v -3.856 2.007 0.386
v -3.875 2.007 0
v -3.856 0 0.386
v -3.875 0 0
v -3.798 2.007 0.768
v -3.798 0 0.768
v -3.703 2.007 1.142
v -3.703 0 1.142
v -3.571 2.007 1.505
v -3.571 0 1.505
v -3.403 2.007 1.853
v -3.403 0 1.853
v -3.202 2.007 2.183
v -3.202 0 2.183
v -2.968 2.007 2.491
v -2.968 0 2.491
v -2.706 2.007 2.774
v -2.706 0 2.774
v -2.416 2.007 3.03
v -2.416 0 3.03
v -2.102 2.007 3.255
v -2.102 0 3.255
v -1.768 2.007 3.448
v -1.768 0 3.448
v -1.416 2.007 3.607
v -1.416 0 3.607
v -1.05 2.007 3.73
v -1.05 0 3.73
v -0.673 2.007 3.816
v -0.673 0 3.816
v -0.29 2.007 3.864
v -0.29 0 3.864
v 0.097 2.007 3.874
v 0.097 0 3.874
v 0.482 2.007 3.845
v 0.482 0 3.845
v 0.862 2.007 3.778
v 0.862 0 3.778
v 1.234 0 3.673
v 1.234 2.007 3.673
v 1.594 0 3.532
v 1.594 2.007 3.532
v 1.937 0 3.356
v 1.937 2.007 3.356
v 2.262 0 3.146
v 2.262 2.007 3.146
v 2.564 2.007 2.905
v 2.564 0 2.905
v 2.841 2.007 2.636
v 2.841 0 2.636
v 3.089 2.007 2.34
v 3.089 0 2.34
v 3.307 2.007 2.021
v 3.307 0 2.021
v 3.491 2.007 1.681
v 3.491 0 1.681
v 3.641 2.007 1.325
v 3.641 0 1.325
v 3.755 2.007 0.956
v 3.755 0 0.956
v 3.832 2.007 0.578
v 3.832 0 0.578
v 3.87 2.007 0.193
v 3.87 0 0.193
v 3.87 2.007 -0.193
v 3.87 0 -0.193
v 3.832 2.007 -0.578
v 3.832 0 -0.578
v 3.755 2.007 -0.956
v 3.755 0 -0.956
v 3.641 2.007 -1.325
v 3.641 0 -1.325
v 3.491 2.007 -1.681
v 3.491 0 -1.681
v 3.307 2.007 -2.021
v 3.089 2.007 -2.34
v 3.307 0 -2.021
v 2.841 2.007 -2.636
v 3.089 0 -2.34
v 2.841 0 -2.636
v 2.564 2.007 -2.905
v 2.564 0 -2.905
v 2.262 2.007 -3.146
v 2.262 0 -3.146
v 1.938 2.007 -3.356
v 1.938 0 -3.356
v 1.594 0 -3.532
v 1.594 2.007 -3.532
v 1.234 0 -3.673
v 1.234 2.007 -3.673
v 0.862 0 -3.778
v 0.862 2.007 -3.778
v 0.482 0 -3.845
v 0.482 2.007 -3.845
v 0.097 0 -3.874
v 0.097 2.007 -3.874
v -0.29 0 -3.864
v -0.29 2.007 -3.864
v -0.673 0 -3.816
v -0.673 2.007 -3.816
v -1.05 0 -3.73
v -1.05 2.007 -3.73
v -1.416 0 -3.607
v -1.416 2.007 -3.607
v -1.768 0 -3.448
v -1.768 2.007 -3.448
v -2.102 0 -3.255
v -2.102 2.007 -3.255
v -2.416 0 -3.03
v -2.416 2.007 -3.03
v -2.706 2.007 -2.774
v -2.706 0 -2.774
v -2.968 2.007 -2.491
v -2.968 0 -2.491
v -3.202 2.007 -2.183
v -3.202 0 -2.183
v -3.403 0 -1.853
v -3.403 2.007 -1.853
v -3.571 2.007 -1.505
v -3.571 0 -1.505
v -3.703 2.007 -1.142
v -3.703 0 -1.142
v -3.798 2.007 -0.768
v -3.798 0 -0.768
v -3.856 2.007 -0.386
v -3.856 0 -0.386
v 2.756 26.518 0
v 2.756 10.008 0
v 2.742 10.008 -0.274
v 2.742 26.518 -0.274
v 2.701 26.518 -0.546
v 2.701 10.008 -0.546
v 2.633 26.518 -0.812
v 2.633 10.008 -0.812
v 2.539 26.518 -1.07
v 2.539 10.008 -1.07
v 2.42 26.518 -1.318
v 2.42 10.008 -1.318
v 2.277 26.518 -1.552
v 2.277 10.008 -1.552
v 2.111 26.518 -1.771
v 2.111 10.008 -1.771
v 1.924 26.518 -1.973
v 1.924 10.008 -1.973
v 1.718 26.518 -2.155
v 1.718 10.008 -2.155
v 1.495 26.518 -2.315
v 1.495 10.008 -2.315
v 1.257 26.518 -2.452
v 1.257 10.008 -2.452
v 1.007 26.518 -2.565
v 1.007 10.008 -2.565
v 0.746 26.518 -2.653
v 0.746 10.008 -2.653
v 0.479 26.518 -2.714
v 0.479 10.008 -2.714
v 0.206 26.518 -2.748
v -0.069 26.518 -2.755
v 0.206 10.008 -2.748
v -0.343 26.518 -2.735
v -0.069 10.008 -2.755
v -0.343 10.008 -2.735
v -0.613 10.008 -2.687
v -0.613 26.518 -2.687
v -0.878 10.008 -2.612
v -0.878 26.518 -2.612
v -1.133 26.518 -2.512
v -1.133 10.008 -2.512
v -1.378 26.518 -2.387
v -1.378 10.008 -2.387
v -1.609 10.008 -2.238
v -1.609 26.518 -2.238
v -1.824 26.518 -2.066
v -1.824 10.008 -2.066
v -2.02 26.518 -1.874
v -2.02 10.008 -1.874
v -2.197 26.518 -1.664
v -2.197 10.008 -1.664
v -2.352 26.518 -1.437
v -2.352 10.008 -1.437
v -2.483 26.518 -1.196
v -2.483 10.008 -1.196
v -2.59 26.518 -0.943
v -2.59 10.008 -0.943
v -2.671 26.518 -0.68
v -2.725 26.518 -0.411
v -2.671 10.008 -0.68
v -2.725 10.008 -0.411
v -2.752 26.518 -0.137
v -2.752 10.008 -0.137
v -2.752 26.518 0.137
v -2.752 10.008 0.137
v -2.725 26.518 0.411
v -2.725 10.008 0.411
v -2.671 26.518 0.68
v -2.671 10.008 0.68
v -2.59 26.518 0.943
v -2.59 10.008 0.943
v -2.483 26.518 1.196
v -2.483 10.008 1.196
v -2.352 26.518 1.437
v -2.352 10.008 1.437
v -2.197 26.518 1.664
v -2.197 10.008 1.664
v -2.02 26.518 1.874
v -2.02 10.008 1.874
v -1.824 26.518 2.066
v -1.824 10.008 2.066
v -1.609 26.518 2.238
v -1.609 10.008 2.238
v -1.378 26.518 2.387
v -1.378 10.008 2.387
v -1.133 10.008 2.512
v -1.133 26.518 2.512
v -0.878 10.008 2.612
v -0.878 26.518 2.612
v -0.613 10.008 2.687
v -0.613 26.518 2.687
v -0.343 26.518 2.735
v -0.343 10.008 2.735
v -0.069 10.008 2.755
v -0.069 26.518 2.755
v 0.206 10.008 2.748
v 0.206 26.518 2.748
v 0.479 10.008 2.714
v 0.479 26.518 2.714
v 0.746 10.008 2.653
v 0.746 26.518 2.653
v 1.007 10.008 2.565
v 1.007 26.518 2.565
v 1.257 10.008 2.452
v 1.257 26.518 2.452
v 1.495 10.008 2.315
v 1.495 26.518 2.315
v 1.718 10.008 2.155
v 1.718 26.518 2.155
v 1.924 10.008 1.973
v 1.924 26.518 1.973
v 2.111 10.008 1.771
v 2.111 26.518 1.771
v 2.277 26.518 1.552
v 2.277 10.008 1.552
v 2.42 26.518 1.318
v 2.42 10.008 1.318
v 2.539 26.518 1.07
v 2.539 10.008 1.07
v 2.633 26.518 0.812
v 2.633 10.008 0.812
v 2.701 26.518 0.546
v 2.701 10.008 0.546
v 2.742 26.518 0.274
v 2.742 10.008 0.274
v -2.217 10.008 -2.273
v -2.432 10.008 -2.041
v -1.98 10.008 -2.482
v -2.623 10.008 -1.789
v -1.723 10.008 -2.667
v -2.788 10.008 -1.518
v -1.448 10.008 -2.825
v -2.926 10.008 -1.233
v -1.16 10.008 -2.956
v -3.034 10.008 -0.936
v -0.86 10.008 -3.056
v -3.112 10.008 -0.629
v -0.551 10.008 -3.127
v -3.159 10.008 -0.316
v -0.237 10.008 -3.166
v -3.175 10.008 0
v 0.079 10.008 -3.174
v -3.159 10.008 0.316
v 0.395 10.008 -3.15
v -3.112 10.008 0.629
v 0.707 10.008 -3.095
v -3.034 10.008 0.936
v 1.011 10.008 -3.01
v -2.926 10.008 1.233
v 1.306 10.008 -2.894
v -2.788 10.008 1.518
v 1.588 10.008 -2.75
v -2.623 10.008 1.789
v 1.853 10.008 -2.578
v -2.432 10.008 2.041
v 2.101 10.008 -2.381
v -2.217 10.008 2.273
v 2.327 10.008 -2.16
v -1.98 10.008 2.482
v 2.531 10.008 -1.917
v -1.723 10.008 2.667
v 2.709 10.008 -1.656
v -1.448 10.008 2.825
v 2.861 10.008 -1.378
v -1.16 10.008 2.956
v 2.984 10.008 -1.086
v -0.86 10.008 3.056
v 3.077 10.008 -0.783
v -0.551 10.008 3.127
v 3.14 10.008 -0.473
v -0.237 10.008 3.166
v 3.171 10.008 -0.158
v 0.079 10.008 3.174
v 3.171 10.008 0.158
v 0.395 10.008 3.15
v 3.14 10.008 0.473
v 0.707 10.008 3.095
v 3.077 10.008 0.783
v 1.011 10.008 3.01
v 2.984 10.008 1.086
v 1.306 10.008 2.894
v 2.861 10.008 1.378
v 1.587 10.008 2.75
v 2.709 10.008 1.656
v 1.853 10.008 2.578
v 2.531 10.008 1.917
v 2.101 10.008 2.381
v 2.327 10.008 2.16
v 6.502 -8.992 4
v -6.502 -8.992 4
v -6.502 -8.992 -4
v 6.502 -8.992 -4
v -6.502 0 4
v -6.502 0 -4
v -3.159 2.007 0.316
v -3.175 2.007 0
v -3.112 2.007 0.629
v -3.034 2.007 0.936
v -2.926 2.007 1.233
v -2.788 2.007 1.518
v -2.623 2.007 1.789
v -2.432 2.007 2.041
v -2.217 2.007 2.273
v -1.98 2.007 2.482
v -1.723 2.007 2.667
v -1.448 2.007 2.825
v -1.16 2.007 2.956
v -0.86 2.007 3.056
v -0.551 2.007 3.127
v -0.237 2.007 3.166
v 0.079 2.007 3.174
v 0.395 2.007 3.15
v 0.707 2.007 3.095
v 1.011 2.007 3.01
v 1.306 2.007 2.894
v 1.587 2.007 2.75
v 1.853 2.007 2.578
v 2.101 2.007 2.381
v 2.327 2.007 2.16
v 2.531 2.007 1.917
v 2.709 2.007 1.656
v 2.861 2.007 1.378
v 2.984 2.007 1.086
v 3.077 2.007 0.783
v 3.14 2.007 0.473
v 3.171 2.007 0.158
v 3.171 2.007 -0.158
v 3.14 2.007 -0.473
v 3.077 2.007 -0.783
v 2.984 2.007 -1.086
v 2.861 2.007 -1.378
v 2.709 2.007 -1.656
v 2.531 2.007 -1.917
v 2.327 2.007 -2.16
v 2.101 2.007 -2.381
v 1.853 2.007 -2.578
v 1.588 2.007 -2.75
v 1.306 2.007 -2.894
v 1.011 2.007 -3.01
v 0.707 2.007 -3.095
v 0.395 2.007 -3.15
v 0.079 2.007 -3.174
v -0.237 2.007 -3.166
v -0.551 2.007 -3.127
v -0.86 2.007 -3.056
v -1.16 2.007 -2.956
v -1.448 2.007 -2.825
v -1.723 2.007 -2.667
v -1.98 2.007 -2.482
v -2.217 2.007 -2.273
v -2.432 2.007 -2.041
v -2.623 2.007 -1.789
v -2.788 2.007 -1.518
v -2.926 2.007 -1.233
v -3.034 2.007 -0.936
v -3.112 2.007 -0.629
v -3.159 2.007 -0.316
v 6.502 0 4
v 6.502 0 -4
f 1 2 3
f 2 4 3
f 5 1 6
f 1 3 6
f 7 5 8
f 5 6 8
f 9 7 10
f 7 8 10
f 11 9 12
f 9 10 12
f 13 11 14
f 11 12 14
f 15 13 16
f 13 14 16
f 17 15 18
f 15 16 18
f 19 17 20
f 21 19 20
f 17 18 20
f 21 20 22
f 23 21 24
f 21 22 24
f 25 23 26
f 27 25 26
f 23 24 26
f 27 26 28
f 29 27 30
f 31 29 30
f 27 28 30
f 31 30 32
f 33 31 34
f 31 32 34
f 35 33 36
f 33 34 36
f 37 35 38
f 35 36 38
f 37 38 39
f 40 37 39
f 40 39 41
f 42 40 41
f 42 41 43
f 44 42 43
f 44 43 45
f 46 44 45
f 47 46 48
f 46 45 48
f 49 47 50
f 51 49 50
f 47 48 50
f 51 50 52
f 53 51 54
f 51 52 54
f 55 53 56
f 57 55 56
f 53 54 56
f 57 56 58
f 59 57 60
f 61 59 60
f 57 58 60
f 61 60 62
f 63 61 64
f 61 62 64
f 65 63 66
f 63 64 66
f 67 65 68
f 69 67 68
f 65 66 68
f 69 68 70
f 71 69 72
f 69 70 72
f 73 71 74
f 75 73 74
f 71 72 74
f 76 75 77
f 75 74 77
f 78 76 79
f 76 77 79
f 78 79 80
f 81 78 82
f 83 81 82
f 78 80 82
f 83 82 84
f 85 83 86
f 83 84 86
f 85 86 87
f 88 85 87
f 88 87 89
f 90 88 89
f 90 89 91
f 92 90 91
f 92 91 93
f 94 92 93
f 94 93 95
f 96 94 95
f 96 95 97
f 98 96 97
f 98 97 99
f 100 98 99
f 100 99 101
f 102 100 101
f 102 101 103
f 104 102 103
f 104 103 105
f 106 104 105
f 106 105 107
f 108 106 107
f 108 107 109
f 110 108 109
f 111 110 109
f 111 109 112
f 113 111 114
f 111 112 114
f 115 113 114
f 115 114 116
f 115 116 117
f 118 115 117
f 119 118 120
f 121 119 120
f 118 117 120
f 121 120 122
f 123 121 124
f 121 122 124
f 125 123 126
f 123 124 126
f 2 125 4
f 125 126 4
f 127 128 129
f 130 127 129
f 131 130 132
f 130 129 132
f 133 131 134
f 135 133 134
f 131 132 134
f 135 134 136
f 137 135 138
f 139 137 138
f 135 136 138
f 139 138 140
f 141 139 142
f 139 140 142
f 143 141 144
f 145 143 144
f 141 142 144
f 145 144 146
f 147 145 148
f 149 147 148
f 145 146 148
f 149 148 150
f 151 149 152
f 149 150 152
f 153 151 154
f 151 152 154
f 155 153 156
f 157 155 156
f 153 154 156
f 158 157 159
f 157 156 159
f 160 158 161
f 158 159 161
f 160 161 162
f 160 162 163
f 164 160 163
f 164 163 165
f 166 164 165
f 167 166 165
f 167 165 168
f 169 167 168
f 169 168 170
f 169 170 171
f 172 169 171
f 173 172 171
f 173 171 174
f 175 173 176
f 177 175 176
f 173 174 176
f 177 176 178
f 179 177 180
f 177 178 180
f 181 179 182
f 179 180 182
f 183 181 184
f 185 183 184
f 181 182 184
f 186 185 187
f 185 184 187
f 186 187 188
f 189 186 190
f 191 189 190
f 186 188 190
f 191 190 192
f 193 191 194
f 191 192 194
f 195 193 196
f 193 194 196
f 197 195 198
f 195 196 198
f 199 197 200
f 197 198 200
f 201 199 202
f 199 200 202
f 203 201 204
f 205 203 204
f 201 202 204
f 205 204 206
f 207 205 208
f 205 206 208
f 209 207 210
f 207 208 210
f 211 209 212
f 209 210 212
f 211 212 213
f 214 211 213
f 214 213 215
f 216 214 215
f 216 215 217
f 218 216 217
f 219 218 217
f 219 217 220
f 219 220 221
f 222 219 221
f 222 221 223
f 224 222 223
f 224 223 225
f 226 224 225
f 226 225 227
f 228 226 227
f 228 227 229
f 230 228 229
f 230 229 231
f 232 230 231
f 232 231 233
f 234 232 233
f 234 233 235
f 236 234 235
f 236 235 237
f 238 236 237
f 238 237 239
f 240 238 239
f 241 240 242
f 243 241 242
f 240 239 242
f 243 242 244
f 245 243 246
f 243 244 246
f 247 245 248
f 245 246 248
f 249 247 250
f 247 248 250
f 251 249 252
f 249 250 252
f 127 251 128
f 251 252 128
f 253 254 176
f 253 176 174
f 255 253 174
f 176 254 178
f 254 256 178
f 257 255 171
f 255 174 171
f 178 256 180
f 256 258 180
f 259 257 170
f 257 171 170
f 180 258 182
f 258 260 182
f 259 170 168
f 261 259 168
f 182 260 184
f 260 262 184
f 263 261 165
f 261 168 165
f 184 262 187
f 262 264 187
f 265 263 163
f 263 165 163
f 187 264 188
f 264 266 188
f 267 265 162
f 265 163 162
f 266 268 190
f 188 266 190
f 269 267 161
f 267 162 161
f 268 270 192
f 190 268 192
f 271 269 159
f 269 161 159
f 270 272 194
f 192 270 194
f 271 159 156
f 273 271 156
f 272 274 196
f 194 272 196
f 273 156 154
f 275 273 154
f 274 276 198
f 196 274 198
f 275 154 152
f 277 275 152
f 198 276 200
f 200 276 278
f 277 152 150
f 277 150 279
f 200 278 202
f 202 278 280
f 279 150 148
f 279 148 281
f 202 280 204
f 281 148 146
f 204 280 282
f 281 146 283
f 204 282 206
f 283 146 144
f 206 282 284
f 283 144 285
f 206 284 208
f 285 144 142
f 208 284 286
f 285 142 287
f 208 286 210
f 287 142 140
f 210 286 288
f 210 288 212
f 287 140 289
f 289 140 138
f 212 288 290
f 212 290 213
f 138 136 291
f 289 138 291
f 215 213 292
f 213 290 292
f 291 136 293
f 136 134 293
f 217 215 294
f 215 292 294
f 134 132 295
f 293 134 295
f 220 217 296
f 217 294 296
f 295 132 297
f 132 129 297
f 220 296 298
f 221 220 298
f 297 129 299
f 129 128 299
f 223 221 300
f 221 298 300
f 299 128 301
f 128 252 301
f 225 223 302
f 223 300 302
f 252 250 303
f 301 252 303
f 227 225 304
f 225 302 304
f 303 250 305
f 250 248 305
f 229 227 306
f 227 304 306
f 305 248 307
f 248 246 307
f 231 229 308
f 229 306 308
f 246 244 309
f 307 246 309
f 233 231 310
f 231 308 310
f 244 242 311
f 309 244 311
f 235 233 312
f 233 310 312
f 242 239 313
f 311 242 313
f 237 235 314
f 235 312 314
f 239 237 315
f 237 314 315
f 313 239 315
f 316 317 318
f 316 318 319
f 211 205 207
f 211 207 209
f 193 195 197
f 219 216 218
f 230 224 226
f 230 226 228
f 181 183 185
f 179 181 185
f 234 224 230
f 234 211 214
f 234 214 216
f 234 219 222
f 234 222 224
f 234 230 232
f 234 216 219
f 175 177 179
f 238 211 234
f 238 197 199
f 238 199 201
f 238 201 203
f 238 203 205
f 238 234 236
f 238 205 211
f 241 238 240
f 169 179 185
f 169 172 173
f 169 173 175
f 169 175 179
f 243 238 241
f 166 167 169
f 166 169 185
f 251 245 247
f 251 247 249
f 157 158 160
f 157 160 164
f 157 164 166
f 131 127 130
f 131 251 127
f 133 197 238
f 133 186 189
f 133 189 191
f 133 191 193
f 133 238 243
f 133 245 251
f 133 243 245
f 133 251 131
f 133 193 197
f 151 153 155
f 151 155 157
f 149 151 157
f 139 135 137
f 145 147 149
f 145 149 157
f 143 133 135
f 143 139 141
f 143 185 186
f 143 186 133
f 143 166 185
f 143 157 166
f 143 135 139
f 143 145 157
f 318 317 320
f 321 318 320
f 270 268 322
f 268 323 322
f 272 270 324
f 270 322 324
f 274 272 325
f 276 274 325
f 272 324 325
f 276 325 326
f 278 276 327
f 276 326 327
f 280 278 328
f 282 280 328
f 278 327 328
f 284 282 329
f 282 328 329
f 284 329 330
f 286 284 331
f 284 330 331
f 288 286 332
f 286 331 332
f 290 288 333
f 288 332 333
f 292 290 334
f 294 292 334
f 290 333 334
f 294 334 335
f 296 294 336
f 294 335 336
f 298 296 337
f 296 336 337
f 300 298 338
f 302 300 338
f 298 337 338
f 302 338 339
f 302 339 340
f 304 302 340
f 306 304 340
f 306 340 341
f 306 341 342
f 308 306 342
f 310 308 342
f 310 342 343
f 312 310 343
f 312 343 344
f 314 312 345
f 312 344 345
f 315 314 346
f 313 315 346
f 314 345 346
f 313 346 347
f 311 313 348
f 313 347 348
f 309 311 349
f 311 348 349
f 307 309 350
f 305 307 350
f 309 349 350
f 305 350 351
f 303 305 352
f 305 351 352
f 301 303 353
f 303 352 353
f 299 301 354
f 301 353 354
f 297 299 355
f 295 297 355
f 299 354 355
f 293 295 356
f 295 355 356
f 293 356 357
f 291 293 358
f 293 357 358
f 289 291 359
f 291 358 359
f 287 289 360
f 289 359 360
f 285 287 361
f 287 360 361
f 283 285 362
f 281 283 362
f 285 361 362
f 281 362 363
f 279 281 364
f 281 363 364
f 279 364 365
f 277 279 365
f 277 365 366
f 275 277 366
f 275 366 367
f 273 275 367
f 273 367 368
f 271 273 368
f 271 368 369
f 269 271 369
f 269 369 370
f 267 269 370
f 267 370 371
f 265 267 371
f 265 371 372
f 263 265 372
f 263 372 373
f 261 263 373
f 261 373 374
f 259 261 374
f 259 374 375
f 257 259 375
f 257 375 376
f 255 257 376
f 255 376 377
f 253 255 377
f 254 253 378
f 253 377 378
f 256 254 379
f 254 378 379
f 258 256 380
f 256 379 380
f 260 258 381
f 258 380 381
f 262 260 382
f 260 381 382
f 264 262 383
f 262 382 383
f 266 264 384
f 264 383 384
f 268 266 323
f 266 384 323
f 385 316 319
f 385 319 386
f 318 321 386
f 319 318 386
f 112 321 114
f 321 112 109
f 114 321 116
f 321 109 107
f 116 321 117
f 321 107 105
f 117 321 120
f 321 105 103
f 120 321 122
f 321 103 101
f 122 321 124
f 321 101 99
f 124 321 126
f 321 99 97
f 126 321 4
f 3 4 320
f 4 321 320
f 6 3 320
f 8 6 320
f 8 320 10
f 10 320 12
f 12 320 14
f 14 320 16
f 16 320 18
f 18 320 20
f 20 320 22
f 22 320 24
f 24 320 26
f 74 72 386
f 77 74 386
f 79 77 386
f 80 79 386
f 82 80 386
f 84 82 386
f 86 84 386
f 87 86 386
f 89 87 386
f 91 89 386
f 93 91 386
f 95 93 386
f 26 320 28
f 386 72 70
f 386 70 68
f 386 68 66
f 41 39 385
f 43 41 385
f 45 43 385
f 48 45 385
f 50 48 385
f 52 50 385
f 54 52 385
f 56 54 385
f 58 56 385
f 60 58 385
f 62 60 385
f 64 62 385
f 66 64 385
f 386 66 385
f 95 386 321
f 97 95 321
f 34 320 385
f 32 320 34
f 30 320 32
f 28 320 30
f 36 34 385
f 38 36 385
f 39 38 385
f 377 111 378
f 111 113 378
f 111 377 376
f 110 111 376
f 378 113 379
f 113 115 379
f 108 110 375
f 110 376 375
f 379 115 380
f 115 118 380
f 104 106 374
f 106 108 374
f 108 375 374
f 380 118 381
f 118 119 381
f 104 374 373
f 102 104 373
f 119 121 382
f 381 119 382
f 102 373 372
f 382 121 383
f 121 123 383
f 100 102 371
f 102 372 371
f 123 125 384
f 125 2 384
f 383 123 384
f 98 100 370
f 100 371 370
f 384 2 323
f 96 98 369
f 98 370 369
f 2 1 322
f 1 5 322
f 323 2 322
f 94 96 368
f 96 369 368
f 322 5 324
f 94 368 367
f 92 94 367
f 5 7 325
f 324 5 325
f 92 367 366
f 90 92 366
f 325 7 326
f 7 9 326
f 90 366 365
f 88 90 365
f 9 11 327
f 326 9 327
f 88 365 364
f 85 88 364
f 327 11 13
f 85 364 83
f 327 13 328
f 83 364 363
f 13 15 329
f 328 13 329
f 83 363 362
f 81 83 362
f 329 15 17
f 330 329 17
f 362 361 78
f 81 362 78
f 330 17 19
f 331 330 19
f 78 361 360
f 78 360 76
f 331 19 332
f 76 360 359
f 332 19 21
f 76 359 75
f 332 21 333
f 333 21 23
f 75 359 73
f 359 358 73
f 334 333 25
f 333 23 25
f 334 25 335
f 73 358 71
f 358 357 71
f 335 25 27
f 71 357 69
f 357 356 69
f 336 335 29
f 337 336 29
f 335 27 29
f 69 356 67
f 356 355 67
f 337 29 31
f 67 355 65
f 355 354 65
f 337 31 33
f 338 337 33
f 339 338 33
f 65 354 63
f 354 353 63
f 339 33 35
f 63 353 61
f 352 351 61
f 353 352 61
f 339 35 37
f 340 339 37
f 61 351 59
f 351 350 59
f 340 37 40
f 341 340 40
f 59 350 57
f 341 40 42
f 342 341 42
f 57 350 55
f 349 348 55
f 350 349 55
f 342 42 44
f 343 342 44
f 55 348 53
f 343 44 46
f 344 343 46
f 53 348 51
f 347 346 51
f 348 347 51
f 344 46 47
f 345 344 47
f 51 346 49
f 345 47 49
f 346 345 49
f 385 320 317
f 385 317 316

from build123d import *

# Parameters (mm, degrees)
SKETCH2_W           = 13.0048
SKETCH2_H           = 8.9916
BOSS_EXTRUDE1_DEPTH = 4.0005
SKETCH4_R           = 2.7559
BOSS_EXTRUDE2_DEPTH = 16.51


with BuildPart() as part:
    # Sketch2 → Boss-Extrude1 (new body, symmetric)
    with BuildSketch(Plane.XY):
        with Locations((0, -4.4958)):
            Rectangle(SKETCH2_W, SKETCH2_H)
    extrude(amount=BOSS_EXTRUDE1_DEPTH, both=True)

    # Sketch3 → Revolve2 (revolve)
    with BuildSketch(Plane.XY):
        Polygon((-3.175, 10.0076), (-3.175, 2.0066), (-3.875, 2.0066), (-3.875, 0), (0, 0), (0, 10.0076), align=None)
    revolve(axis=Axis((0, 0, 0), (0, 1, 0)))

    # Sketch4 → Boss-Extrude2 (add)
    with BuildSketch(Plane(origin=(0, 10.0076, 0), x_dir=(1, 0, 0), z_dir=(0, 1, 0))):
        Circle(SKETCH4_R)
    extrude(amount=BOSS_EXTRUDE2_DEPTH)


solid = part.part
